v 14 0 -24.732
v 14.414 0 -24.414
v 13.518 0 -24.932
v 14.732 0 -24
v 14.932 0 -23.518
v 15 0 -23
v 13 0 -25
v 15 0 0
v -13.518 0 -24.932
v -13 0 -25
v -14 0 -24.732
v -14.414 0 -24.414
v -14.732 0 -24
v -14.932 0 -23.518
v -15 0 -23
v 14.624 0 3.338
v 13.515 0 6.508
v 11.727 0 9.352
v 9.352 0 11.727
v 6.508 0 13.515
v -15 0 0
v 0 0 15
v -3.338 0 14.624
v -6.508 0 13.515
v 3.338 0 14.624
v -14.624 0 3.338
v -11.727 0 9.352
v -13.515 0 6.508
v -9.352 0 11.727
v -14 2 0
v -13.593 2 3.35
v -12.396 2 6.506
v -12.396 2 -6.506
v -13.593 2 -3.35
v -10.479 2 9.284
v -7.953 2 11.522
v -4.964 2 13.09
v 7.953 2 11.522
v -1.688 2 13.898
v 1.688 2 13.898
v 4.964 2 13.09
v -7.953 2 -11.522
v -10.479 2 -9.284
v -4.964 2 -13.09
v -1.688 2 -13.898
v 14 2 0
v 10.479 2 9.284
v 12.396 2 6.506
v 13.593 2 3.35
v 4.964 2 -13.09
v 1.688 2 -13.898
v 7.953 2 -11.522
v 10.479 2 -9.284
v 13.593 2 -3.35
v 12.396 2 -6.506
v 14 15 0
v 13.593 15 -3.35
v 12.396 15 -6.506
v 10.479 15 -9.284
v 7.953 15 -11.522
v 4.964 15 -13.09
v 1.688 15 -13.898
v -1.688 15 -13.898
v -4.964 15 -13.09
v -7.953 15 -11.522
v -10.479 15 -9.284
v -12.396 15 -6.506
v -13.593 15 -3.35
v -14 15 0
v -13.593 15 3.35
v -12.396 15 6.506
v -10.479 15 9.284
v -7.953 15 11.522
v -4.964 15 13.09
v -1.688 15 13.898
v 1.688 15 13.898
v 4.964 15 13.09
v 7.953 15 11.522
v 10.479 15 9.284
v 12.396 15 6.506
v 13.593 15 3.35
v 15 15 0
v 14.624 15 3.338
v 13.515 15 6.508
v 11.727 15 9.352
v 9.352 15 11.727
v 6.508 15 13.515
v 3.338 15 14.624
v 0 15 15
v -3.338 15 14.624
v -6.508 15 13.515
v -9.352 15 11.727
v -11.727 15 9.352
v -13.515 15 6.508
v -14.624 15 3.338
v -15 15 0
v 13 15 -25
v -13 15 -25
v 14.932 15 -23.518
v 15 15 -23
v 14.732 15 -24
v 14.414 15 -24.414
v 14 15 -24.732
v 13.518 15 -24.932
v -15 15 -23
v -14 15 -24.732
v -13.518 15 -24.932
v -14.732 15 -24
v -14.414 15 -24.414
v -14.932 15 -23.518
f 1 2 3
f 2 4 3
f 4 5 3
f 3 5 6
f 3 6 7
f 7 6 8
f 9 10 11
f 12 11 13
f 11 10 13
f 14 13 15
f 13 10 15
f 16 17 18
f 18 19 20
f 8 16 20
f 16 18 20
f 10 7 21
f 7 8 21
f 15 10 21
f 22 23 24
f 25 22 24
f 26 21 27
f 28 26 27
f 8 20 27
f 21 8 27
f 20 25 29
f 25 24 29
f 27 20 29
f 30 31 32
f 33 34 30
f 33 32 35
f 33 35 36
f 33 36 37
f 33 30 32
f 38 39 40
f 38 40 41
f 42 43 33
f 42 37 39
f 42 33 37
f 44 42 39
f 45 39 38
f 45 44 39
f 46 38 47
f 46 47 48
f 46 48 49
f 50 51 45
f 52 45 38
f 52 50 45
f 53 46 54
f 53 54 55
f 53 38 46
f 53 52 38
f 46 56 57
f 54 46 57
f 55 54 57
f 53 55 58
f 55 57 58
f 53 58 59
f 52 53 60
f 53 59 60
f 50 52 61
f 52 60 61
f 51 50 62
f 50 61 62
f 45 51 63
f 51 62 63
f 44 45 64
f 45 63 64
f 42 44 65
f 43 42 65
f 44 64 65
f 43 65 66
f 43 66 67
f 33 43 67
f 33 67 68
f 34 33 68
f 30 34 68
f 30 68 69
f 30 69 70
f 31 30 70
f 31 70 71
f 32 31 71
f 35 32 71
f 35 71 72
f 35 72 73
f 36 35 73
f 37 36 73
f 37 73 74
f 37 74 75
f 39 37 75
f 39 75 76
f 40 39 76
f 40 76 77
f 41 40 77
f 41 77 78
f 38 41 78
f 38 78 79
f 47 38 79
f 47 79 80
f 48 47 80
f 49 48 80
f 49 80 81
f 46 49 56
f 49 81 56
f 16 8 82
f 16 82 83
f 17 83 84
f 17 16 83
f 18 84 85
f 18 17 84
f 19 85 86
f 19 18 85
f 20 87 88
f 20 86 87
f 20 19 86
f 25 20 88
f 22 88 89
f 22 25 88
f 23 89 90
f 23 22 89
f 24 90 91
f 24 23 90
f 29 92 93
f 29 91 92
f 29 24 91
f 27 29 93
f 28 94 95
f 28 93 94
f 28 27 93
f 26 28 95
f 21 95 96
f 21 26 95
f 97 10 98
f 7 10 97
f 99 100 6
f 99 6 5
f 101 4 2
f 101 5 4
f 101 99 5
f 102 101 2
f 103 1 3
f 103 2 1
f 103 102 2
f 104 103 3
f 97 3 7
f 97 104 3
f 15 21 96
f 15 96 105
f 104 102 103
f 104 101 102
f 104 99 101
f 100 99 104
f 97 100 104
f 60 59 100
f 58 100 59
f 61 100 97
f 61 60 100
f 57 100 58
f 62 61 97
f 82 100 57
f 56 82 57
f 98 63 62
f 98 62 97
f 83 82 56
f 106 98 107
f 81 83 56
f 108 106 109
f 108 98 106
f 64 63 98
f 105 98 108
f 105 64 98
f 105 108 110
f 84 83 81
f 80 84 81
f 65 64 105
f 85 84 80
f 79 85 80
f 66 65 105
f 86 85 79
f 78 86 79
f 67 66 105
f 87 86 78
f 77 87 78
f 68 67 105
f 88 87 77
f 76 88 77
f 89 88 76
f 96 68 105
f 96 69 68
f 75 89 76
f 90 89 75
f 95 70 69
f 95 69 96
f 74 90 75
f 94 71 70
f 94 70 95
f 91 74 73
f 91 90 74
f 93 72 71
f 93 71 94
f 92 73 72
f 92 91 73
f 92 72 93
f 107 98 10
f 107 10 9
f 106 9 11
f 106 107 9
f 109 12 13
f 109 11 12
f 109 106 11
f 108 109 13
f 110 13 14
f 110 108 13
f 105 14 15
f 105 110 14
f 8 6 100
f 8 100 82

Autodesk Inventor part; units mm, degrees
ref_plane "YZ Plane" through (0, 0, 0) normal (1, 0, 0) x (0, 1, 0)
ref_plane "XZ Plane" through (0, 0, 0) normal (0, 1, 0) x (-1, 0, 0)
ref_plane "XY Plane" through (0, 0, 0) normal (0, 0, 1) x (1, 0, 0)
sketch "Esquisse1" plane through (0, 0, 0) normal (0, 1, 0) x (-1, 0, 0)
  arc A0 (15, 0) -> (-15, 0) centre (0, 0) ccw
  line L0 (-15, 0) -> (15, 0) construction
  line L1 (15, 0) -> (15, -25)
  line L2 (15, -25) -> (-15, -25)
  line L3 (-15, -25) -> (-15, 0)
  arc A1 (-15, 0) -> (15, 0) centre (0, 0) ccw construction
  dimension "d0" = 30
  dimension "d1" = 25
extrude "Extrusion1" add sketch "Esquisse1" along normal blind 15
sketch "Esquisse2" plane through (0, 15, 0) normal (0, 1, 0) x (1, 0, 0)
  arc A0 (-15, 0) -> (15, 0) centre (0, 0) ccw projected
  circle A1 centre (0, 0) radius 14
  dimension "d4" = 28
extrude "Extrusion2" cut sketch "Esquisse2" against normal blind 13
fillet "Congé1" radius 2 2 edges at (-15, 7.5, -25) (15, 7.5, -25)
properties part number "encoder_shell"
